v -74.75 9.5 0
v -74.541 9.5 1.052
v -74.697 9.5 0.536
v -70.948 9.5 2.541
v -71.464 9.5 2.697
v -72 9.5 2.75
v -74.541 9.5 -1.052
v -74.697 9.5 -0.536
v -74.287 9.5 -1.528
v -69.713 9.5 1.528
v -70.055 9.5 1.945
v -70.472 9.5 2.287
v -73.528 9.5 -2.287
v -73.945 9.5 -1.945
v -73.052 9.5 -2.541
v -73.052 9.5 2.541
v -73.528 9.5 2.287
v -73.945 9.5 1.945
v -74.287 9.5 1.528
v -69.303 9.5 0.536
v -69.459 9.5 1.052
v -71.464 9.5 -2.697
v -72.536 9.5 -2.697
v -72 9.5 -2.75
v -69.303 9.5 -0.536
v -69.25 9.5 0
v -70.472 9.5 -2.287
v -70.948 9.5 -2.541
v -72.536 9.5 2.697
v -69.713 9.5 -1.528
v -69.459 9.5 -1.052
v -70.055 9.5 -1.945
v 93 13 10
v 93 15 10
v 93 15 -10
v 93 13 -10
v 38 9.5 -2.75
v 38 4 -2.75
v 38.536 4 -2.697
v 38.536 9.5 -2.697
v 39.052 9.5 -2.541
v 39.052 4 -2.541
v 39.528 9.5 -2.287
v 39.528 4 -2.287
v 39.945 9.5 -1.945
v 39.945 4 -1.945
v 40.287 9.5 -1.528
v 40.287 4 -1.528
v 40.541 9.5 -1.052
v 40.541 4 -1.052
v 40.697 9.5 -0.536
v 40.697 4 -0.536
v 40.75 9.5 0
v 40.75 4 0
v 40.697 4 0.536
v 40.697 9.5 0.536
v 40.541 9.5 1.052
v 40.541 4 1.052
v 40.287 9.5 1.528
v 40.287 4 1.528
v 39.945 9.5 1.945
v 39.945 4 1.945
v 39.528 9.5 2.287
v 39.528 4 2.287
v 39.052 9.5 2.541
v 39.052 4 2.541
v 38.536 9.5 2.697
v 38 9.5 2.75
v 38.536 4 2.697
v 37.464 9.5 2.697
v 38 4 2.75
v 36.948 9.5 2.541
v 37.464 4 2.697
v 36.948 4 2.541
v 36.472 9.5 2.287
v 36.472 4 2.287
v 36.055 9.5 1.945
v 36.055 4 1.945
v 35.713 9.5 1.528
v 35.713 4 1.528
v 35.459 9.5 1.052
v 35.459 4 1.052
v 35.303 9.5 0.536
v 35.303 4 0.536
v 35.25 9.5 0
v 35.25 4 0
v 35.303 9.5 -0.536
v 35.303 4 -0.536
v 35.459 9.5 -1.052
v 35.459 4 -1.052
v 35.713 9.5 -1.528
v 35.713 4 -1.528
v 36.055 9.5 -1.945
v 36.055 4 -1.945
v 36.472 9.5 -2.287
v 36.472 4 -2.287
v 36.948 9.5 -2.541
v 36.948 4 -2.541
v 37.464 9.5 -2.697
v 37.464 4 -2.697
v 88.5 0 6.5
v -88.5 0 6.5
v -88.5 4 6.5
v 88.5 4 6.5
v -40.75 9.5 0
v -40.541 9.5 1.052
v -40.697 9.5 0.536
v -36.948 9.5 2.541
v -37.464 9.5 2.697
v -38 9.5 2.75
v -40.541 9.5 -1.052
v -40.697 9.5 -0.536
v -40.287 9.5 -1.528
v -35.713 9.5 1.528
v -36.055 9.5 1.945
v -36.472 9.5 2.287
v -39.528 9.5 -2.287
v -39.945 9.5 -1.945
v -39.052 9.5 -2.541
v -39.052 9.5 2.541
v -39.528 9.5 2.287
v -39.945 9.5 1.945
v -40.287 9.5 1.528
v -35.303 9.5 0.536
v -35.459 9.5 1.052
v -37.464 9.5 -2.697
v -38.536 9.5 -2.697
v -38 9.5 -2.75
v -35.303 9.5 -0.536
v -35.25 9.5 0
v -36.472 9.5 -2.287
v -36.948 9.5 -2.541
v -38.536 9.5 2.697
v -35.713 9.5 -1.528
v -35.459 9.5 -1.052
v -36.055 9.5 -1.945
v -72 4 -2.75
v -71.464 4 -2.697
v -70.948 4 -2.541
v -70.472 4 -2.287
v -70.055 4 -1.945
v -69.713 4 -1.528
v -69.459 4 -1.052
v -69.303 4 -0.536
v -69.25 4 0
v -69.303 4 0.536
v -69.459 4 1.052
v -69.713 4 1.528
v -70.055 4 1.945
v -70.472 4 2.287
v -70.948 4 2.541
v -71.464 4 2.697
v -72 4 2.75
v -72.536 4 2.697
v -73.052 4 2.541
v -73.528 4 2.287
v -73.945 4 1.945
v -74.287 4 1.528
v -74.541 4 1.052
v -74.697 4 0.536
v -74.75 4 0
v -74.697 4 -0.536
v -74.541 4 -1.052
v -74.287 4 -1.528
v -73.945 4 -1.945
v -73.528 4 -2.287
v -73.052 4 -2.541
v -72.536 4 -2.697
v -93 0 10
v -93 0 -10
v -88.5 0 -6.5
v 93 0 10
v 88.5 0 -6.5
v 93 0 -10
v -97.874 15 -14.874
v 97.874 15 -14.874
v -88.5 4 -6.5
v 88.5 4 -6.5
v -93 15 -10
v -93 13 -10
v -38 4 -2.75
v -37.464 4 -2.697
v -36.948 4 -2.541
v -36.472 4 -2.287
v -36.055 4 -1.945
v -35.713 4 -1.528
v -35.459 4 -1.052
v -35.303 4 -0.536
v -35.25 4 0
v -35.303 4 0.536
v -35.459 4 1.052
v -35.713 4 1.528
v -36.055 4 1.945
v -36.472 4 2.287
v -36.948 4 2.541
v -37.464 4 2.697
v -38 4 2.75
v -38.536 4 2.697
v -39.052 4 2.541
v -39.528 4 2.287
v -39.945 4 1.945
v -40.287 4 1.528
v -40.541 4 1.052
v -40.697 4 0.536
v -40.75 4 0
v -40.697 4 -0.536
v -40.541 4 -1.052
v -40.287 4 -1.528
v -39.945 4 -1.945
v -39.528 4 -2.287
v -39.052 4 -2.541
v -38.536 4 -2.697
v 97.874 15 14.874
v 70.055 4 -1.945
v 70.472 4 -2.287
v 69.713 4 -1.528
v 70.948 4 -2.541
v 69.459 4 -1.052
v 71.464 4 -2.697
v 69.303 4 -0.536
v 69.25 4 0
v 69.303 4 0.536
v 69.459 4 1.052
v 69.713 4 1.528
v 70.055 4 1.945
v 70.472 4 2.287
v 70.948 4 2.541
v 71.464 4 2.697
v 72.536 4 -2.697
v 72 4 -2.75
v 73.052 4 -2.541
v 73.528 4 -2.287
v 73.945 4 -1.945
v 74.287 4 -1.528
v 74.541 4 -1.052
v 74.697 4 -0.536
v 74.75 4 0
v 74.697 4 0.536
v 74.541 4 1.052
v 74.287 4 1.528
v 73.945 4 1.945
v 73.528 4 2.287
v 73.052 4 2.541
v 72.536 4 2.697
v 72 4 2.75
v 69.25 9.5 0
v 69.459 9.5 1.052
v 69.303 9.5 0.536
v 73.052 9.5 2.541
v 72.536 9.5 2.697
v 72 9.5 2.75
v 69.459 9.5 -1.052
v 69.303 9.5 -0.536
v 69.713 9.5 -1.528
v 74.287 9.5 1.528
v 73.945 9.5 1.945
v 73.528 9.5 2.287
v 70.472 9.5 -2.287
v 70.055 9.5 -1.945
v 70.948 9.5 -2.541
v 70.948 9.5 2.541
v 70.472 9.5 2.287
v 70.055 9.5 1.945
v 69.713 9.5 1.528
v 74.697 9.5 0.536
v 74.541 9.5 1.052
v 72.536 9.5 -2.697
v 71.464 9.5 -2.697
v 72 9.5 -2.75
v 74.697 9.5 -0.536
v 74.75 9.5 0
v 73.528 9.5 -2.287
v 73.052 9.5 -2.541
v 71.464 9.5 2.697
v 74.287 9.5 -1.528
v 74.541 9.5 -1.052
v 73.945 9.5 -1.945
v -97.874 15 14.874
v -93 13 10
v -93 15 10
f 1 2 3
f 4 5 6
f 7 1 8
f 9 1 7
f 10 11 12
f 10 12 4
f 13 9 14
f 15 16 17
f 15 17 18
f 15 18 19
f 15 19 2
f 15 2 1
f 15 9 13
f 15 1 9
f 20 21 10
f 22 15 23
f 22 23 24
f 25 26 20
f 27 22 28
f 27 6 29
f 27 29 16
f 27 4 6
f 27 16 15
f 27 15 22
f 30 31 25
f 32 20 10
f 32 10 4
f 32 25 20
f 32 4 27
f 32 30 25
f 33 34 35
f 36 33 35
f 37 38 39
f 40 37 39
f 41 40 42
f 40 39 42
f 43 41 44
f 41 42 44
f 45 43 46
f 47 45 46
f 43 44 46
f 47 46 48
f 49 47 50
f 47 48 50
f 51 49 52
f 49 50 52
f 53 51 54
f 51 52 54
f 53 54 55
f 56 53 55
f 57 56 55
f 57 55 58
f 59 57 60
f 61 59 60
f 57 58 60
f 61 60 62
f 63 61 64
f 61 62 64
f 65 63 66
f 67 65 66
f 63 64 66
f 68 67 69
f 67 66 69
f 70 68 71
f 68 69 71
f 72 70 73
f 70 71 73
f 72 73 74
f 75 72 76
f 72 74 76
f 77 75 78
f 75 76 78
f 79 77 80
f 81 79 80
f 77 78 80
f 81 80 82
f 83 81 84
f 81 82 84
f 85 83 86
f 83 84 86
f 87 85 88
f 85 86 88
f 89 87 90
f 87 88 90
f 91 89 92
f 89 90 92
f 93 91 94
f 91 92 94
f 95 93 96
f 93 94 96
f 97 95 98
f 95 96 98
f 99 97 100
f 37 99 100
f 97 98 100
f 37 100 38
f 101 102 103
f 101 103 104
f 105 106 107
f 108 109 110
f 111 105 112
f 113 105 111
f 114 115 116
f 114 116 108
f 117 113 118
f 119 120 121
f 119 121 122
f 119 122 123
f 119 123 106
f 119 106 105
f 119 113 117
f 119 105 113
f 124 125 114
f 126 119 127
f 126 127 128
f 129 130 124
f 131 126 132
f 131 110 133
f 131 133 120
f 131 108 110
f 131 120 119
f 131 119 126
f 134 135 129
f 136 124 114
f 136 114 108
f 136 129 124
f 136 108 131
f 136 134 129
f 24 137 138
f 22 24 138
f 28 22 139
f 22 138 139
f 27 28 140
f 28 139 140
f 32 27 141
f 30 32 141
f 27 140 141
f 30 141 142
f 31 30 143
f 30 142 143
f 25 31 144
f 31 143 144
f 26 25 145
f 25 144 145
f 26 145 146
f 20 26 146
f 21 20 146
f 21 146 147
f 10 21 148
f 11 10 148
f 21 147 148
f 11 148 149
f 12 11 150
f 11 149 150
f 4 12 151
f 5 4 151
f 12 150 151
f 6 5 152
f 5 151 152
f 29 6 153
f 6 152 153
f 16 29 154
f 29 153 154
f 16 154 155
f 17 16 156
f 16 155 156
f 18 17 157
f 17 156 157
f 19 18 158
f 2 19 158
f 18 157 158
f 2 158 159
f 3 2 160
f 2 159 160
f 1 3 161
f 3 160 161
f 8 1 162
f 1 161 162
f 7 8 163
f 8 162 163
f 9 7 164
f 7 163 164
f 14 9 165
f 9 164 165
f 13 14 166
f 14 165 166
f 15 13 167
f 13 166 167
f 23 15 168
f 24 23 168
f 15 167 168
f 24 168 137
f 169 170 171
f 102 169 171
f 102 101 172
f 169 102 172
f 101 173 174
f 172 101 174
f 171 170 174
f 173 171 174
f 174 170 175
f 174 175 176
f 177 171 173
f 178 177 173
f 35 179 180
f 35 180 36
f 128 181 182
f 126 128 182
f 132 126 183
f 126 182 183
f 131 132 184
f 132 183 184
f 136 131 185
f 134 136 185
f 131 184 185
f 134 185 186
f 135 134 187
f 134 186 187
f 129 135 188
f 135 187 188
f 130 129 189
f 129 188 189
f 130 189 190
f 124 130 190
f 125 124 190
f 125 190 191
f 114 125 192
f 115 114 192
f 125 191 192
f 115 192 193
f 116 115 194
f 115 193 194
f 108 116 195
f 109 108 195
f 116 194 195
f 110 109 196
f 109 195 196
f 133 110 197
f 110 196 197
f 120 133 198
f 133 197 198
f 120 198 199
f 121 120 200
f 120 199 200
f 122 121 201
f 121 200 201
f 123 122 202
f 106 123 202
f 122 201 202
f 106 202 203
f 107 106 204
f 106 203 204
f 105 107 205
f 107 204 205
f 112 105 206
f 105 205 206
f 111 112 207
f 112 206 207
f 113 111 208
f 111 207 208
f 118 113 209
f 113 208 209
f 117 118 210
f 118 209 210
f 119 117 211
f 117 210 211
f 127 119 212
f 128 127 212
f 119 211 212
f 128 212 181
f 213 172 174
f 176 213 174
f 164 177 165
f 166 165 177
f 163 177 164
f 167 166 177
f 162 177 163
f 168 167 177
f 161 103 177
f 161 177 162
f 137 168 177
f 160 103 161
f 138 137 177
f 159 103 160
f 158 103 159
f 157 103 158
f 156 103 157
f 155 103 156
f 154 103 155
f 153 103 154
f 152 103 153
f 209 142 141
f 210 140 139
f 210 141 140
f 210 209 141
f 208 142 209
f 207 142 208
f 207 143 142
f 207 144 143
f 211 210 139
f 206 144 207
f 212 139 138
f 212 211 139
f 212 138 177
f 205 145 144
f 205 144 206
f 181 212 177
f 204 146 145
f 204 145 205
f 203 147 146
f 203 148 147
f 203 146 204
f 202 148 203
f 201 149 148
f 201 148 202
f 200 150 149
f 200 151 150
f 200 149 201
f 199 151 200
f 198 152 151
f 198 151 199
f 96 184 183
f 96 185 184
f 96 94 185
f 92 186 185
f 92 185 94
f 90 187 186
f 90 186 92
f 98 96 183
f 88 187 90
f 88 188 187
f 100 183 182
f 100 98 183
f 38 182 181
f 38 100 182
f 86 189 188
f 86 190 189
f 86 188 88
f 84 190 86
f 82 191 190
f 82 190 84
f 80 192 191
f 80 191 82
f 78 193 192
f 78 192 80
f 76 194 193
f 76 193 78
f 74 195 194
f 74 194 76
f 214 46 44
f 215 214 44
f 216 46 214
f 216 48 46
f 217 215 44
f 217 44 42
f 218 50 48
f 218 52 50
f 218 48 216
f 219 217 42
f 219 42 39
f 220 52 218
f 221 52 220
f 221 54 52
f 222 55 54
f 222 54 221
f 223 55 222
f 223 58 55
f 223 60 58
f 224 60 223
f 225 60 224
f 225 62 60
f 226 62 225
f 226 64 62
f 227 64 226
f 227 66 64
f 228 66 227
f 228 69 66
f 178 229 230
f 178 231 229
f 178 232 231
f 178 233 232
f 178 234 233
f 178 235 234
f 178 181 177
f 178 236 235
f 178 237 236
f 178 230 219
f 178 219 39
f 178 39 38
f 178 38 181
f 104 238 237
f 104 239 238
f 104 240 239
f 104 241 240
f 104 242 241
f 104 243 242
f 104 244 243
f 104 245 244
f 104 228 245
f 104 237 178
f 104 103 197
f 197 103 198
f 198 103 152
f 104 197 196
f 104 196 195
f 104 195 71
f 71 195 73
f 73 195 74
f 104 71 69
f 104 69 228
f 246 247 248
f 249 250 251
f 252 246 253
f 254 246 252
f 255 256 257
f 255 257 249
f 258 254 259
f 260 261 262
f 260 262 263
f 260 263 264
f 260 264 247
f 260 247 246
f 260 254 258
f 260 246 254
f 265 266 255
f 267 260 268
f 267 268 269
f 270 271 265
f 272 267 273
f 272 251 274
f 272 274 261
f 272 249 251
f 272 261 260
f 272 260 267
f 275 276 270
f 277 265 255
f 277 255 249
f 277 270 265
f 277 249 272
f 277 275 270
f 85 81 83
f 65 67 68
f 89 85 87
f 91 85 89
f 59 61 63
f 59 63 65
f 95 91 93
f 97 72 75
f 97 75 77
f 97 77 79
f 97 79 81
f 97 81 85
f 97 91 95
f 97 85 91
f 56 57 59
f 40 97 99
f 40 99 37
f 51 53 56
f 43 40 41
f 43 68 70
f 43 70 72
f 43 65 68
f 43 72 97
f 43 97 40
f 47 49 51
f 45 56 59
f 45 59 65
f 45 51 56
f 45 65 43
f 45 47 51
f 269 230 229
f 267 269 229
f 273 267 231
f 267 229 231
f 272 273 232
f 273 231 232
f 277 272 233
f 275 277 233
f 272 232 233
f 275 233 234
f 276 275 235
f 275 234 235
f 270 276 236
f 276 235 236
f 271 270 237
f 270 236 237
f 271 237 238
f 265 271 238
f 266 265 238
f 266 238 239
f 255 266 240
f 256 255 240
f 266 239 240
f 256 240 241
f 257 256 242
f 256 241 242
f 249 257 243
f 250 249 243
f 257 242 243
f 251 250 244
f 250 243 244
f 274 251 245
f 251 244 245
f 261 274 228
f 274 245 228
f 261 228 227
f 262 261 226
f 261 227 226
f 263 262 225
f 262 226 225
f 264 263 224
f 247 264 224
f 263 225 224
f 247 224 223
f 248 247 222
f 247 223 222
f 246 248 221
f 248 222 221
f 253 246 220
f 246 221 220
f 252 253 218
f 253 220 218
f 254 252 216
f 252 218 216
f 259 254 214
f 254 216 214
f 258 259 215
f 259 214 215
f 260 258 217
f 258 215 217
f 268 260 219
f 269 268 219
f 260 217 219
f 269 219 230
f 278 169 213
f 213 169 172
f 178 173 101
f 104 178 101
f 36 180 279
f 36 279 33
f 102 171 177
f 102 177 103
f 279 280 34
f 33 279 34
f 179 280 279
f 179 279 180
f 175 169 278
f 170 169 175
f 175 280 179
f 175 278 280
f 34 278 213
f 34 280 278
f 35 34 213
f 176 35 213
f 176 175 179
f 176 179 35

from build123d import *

# Parameters (mm, degrees)
SKETCH_1_W          = 186
SKETCH_1_H          = 20
EXTRUDE_1_DEPTH     = 15
EXTRUDE_1_DRAFT     = -18
SKETCH_2_W          = 186
SKETCH_2_H          = 20
CUT_EXTRUDE_2_DEPTH = 2
SKETCH_3_W          = 177
SKETCH_3_H          = 13
CUT_EXTRUDE_3_DEPTH = 4
SKETCH_4_R          = 2.75
CUT_EXTRUDE_6_DEPTH = 5.5


with BuildPart() as part:
    # 草图1 → 凸台-拉伸1 (with draft: the straight prism first)
    with BuildSketch(Plane(origin=(0, 0, 0), x_dir=(1, 0, 0), z_dir=(0, 1, 0))):
        Rectangle(SKETCH_1_W, SKETCH_1_H)
    extrude(amount=EXTRUDE_1_DEPTH)
    # 凸台-拉伸1: the draft: its side faces are tilted about the plane it starts from
    extrude_1_sides = [part.faces().sort_by_distance(p)[0] for p in [
        (-93, 7.5, 0),
        (0, 7.5, 10),
        (93, 7.5, 0),
        (0, 7.5, -10),
    ]]
    draft(extrude_1_sides, Plane(origin=(0, 0, 0), x_dir=(1, 0, 0), z_dir=(0, 1, 0)), EXTRUDE_1_DRAFT)

    # 草图2 → 切除-拉伸2 (cut)
    with BuildSketch(Plane(origin=(0, 15, 0), x_dir=(1, 0, 0), z_dir=(0, 1, 0))):
        Rectangle(SKETCH_2_W, SKETCH_2_H)
    extrude(amount=-CUT_EXTRUDE_2_DEPTH, mode=Mode.SUBTRACT)

    # 草图3 → 切除-拉伸3 (cut)
    with BuildSketch(Plane.XZ):
        Rectangle(SKETCH_3_W, SKETCH_3_H)
    extrude(amount=-CUT_EXTRUDE_3_DEPTH, mode=Mode.SUBTRACT)

    # 草图4 → 切除-拉伸6 (cut)
    with BuildSketch(Plane.XZ.offset(-4)):
        with Locations(Location((-72, 0, 0), (0, 0, 270))):
            Circle(SKETCH_4_R)
        with Locations(Location((-38, 0, 0), (0, 0, 270))):
            Circle(SKETCH_4_R)
        with Locations(Location((38, 0, 0), (0, 0, 270))):
            Circle(SKETCH_4_R)
        with Locations(Location((72, 0, 0), (0, 0, 270))):
            Circle(SKETCH_4_R)
    extrude(amount=-CUT_EXTRUDE_6_DEPTH, mode=Mode.SUBTRACT)


solid = part.part
